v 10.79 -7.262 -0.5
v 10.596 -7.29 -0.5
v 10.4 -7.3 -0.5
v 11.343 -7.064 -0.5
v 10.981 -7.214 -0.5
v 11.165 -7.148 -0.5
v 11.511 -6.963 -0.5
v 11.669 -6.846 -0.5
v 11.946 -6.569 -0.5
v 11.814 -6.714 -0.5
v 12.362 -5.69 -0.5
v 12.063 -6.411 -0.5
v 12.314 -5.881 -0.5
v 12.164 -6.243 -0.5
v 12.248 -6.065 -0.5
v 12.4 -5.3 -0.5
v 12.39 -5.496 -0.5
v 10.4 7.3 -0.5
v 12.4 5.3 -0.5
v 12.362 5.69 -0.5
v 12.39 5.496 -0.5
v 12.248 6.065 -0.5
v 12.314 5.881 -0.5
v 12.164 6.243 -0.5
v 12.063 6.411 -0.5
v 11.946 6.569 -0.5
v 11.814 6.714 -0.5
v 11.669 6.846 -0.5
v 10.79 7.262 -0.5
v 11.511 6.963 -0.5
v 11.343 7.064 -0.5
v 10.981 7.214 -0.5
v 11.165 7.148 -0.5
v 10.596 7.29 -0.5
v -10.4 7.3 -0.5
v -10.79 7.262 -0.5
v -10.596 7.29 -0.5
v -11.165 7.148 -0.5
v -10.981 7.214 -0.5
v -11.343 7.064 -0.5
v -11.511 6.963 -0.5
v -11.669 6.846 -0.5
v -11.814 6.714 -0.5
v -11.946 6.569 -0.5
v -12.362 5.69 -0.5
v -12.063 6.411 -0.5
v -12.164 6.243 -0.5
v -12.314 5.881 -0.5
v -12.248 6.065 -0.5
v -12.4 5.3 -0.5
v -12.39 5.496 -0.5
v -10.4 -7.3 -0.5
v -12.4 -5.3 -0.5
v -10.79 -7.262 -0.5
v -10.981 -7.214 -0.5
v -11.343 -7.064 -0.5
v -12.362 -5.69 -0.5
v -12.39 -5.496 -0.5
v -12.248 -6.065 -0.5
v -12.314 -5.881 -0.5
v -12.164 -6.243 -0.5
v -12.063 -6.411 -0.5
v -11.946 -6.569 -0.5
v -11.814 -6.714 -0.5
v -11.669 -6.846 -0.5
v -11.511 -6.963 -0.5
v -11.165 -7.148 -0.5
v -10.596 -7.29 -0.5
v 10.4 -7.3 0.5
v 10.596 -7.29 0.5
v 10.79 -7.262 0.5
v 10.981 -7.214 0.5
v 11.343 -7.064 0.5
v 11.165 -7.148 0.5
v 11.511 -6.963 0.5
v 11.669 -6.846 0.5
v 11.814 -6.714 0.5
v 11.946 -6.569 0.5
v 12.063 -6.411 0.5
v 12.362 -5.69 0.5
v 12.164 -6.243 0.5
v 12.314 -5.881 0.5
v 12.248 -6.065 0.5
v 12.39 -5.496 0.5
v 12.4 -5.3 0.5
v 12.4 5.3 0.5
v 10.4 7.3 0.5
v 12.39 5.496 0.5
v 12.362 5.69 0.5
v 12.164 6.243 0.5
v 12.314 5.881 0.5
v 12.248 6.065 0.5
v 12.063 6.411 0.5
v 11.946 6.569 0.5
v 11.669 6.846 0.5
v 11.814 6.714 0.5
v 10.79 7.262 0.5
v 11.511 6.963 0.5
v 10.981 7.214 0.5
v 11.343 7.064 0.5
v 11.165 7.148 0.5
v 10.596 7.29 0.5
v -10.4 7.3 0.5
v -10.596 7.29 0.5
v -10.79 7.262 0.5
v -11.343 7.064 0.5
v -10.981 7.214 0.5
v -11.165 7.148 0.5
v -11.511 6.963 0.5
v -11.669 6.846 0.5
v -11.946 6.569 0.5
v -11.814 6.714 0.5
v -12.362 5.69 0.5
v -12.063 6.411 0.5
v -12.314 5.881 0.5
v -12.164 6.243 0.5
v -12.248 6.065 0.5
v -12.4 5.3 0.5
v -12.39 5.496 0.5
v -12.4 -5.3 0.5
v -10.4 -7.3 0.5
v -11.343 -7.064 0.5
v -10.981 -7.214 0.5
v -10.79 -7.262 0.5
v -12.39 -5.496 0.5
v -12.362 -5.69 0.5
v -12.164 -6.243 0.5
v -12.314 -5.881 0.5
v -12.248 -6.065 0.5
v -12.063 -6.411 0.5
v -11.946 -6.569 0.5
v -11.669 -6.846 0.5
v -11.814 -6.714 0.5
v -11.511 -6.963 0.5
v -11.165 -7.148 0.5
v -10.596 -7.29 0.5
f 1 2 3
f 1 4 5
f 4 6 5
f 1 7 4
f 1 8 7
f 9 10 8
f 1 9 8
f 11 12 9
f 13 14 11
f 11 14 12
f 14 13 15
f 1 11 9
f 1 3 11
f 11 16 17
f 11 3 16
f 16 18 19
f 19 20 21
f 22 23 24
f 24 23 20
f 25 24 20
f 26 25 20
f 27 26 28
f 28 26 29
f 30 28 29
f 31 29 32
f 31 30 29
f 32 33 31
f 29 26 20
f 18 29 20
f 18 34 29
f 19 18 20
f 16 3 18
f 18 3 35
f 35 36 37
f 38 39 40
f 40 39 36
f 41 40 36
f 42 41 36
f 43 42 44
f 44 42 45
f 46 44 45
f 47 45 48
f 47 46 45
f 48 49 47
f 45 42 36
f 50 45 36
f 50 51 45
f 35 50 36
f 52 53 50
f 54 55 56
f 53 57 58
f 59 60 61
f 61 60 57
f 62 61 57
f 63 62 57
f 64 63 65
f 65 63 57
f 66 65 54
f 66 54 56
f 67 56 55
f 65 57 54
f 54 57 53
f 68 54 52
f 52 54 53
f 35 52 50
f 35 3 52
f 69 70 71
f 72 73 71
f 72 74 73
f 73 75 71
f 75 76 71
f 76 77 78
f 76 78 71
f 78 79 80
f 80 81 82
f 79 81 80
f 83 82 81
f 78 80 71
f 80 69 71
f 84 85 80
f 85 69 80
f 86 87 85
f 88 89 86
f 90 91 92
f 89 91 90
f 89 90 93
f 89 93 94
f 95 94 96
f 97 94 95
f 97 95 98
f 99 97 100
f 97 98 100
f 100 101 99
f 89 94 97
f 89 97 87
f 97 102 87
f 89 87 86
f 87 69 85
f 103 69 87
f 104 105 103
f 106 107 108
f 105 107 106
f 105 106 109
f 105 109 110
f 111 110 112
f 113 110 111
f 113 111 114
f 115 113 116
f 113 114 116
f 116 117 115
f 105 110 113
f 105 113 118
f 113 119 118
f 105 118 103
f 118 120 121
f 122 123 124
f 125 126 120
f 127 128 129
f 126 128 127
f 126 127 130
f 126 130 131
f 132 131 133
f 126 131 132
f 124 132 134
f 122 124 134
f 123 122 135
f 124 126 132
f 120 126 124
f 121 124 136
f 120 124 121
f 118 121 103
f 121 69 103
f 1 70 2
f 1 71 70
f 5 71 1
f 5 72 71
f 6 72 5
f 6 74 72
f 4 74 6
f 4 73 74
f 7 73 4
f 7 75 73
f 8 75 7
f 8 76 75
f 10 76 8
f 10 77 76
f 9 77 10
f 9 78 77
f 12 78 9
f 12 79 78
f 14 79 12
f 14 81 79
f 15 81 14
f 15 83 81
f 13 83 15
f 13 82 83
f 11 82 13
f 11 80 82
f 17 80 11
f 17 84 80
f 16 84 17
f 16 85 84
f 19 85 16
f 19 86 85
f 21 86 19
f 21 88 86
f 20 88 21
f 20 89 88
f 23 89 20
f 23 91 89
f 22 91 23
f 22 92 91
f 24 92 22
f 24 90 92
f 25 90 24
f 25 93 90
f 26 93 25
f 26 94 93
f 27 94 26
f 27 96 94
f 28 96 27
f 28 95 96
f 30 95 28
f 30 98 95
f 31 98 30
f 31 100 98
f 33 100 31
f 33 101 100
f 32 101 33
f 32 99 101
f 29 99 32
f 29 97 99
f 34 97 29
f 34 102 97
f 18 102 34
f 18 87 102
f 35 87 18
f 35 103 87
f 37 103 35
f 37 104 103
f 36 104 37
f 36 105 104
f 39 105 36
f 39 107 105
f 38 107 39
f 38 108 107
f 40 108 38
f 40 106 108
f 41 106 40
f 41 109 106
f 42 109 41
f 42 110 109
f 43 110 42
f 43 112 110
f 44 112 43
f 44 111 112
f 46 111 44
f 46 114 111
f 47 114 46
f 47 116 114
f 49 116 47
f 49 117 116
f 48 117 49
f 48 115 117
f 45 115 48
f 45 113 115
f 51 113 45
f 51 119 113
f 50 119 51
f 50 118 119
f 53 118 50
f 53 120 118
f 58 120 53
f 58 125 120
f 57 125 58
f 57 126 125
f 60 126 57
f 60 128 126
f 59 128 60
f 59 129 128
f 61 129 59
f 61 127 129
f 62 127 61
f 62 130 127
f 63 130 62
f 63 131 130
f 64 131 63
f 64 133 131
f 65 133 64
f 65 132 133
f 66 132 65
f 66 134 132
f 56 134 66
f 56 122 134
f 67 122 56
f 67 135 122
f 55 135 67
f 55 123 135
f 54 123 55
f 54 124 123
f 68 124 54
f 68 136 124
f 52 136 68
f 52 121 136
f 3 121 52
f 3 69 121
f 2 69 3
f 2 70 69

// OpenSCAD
// Simple PCB slab: 24.8mm x 14.6mm x 1.0mm (one connected solid)

length = 24.8;
width  = 14.6;
thickness = 1.0;

// Rounded corner radius (kept modest; set to 0 for sharp corners)
corner_radius = 2.0;

$fn = 64;

module rounded_rect_2d(l, w, r) {
    r2 = min(r, l/2, w/2);
    if (r2 <= 0)
        square([l, w], center=true);
    else
        offset(r=r2)
            square([l - 2*r2, w - 2*r2], center=true);
}

module pcb() {
    linear_extrude(height=thickness, center=true, convexity=10)
        rounded_rect_2d(length, width, corner_radius);
}

pcb();
